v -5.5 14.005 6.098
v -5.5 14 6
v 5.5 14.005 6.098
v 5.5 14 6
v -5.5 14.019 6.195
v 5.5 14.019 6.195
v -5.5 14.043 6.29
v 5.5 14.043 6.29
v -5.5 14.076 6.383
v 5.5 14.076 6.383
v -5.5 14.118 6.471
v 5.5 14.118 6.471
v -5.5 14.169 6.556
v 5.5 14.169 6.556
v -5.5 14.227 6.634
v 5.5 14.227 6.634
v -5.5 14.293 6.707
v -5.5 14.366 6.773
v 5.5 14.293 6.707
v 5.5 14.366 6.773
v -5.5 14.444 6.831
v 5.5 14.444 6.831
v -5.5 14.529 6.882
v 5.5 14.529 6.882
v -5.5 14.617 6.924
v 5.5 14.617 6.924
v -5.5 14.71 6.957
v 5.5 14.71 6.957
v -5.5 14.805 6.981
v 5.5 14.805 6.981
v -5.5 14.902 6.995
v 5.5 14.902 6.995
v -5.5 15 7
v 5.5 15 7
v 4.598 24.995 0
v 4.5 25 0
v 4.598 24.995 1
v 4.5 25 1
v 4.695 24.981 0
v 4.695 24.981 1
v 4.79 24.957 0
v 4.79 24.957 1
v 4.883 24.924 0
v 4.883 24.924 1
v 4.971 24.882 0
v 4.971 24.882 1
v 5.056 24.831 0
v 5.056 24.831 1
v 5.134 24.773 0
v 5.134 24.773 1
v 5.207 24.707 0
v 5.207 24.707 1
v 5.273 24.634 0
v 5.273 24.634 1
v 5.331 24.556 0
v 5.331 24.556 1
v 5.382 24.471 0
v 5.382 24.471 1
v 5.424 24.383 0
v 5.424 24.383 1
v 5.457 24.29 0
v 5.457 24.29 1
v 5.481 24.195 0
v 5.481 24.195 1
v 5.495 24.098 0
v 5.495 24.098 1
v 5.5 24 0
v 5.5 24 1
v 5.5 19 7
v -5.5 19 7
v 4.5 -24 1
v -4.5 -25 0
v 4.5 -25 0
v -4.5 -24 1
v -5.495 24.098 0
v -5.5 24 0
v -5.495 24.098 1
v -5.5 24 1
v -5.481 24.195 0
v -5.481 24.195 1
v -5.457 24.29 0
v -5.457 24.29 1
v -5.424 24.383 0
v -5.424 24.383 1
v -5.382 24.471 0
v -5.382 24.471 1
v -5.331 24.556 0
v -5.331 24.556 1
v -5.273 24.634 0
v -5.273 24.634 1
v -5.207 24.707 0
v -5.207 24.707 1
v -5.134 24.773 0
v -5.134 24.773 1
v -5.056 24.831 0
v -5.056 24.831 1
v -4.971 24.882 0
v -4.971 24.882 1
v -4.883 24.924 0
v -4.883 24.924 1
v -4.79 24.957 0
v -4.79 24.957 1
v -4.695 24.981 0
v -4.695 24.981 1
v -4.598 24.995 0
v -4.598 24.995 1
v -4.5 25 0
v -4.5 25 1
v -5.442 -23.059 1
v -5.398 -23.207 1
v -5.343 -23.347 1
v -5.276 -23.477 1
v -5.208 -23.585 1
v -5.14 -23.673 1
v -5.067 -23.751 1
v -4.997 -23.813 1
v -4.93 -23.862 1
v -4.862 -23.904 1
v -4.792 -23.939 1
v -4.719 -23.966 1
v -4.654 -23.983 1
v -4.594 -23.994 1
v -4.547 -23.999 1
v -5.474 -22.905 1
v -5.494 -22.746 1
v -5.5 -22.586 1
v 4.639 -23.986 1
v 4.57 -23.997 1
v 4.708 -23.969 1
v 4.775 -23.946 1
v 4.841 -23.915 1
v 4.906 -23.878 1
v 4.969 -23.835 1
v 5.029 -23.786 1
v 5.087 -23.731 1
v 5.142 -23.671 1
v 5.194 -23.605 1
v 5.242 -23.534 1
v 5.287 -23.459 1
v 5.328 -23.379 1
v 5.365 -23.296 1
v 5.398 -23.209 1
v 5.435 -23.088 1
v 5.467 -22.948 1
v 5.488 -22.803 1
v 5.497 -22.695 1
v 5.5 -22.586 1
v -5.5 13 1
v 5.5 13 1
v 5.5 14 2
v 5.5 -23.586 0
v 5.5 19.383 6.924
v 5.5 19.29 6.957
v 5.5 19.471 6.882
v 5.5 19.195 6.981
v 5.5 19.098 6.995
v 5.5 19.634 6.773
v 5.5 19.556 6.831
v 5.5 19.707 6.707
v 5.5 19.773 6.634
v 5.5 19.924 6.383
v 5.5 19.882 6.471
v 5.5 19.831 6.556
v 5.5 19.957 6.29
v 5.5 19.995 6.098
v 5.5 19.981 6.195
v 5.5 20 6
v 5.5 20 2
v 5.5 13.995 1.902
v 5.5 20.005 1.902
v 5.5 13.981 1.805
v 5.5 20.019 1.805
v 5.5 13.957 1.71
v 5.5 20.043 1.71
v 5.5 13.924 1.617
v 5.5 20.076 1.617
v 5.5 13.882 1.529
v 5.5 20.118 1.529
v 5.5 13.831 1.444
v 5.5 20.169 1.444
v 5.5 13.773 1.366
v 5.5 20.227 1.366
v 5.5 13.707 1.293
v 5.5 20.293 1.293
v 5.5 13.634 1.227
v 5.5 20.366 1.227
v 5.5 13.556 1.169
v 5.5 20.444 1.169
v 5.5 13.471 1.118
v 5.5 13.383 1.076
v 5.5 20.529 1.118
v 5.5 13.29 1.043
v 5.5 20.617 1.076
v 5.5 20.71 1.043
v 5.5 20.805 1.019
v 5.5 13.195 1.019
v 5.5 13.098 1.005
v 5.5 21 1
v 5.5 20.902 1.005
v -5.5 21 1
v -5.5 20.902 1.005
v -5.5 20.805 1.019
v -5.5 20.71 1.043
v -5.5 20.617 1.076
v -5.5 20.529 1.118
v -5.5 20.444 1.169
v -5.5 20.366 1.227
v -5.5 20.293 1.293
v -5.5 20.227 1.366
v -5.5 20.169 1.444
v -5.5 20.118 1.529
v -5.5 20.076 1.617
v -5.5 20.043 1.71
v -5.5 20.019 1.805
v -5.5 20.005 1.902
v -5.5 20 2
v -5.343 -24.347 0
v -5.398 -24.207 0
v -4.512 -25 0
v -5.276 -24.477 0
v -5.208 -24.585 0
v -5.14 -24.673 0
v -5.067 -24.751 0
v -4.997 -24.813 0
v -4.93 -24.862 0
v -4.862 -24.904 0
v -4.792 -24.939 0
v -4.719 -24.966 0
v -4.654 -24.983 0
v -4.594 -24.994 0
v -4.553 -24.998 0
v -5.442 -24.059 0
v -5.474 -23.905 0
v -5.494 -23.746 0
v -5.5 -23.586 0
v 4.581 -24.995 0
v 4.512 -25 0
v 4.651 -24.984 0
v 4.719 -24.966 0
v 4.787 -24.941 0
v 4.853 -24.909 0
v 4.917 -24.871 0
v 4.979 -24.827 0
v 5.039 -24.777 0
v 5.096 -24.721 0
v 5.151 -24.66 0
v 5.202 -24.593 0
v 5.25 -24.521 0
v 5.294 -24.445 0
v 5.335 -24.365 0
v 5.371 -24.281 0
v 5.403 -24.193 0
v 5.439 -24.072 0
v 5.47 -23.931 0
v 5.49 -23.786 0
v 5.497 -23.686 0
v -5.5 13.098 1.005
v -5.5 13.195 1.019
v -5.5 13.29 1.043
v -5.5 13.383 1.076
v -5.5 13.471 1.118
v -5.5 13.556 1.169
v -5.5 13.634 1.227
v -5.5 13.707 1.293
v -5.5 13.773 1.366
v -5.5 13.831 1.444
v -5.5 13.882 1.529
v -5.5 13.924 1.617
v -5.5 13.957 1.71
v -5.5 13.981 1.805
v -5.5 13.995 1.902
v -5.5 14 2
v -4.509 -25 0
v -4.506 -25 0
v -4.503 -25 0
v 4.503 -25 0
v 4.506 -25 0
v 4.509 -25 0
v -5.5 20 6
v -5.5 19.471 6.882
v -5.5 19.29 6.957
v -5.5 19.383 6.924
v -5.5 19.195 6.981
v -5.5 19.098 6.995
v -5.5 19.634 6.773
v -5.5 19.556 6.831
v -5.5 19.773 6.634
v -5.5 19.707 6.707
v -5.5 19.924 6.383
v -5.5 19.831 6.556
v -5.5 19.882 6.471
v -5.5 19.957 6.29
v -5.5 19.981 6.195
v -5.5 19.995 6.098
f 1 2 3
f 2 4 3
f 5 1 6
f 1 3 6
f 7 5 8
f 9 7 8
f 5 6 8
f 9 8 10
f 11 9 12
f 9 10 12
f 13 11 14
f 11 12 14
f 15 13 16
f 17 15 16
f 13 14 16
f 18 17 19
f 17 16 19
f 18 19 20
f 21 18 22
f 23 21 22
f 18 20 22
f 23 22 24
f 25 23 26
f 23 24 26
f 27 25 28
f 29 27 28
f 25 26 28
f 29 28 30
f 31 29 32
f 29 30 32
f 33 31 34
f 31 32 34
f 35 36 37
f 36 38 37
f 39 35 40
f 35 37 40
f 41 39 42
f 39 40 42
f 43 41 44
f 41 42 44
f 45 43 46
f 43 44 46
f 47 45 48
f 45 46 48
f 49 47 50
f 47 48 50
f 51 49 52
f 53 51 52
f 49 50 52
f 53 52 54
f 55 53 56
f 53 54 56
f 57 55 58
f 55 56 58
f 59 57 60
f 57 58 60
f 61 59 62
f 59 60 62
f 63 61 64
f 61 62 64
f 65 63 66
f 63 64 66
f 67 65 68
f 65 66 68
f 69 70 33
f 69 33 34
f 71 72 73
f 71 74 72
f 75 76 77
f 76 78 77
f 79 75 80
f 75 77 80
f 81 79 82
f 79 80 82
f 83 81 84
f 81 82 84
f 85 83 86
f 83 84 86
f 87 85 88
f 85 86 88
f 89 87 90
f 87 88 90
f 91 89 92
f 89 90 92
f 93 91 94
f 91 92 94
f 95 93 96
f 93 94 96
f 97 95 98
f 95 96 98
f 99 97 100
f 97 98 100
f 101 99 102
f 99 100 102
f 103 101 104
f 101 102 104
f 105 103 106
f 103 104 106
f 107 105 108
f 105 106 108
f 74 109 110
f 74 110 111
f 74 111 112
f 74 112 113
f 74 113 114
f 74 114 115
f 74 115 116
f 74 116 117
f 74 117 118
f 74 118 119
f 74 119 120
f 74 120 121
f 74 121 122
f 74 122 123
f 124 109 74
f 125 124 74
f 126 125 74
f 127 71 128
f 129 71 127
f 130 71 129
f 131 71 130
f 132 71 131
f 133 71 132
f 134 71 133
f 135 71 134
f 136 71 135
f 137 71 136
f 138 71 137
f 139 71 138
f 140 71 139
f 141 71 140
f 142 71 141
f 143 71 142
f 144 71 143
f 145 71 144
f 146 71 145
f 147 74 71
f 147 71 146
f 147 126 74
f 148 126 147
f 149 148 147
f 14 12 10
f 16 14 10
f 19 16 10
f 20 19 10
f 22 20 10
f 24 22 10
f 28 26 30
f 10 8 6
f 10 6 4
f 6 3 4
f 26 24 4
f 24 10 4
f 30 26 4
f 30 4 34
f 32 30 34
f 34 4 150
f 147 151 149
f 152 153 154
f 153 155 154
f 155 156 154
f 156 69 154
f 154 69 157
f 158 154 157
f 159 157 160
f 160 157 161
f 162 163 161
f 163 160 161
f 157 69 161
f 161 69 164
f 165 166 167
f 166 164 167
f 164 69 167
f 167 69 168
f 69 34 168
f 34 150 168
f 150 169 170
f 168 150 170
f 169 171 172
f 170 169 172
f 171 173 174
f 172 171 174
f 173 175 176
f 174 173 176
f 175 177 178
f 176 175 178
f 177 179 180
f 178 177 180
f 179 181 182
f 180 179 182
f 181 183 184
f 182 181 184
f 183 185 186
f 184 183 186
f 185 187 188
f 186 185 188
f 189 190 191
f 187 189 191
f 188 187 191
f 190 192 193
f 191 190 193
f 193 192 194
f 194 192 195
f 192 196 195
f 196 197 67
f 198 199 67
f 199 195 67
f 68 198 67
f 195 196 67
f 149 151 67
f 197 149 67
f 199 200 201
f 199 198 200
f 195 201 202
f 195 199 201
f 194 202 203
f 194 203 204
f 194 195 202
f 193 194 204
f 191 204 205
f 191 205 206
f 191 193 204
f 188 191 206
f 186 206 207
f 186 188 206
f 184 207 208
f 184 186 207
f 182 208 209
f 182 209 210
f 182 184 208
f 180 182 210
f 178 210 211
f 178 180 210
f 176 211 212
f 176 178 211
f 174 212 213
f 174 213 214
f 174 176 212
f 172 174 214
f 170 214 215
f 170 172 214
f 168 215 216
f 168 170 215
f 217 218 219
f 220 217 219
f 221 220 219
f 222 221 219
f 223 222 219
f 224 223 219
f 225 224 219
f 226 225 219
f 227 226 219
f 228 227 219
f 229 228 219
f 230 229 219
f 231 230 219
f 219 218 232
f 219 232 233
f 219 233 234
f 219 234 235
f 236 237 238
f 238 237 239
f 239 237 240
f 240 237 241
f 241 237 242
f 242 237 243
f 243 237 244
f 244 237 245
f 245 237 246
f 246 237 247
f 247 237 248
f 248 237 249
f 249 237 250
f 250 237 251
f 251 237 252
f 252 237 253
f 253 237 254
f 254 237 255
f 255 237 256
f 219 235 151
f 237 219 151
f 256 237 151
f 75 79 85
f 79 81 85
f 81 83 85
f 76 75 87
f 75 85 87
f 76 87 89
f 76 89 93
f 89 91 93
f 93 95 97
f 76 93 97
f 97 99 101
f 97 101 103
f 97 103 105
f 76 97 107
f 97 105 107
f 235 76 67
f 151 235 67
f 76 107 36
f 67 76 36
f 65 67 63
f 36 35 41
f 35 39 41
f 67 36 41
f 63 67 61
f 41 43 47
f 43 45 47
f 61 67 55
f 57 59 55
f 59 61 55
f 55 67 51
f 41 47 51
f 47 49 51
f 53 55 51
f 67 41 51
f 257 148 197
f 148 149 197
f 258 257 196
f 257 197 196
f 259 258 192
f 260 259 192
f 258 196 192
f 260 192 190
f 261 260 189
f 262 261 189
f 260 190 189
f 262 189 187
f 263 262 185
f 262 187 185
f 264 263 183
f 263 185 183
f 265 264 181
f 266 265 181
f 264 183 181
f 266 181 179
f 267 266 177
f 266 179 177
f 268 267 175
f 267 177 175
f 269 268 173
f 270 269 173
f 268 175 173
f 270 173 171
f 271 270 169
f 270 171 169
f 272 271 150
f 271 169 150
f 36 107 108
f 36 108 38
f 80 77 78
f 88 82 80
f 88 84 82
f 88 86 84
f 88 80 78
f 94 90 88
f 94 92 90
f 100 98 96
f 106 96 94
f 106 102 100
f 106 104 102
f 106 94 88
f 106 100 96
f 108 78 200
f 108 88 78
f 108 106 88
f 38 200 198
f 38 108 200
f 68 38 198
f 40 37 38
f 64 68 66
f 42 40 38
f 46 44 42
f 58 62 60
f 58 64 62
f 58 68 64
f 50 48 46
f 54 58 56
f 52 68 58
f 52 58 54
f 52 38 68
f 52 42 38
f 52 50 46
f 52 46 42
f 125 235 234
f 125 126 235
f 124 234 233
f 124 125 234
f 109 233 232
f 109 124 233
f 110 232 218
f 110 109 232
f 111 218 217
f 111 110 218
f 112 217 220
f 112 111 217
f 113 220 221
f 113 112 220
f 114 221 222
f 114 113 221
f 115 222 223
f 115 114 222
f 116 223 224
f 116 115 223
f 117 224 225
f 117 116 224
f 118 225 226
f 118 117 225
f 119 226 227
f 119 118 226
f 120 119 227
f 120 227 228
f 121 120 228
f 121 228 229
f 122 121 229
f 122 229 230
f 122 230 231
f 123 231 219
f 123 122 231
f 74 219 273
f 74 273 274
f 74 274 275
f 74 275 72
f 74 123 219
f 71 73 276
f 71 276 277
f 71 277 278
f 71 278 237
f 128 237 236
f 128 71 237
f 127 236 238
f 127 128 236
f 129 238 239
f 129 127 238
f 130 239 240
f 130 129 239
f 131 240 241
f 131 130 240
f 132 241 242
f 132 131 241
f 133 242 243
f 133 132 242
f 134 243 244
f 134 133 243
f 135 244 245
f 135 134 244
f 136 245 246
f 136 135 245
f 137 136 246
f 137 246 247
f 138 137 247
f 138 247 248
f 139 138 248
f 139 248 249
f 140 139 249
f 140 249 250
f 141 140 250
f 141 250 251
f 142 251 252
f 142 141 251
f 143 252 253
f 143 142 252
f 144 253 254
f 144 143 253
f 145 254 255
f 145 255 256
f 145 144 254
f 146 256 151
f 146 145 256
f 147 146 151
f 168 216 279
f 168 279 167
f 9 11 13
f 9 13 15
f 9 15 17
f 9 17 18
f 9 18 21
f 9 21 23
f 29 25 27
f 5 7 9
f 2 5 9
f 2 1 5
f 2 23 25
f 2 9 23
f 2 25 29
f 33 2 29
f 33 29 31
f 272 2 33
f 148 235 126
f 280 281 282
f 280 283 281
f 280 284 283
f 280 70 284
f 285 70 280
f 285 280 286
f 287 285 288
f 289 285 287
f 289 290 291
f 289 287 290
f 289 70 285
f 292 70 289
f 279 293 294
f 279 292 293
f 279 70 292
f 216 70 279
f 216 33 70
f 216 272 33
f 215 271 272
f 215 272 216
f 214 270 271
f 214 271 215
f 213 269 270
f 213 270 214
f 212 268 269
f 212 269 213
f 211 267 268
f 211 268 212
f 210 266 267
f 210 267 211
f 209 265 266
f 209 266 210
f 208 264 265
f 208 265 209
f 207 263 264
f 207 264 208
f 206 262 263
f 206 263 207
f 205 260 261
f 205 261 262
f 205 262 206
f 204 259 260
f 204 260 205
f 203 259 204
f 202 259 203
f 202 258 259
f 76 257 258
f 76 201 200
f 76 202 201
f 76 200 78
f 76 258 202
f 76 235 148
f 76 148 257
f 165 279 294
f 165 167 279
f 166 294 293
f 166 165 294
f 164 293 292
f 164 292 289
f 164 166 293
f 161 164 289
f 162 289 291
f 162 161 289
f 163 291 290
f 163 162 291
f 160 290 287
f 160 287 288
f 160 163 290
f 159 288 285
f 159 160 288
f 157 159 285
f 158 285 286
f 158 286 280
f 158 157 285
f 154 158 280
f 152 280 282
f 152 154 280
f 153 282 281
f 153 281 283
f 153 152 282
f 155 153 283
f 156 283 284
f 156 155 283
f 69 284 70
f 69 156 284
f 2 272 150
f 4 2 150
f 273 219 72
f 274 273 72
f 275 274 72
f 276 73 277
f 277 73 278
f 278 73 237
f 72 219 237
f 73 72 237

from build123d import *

# Parameters (mm, degrees)
SZKIC1_W                    = 11
SZKIC1_H                    = 50
DODANIE_WYCI_GNI_CIE1_DEPTH = 1
SFAZOWANIE1_SIZE            = 1
SZKIC2_W                    = 11
SZKIC2_H                    = 6
DODANIE_WYCI_GNI_CIE2_DEPTH = 6
ZAOKR_GLENIE1_R             = 1


with BuildPart() as part:
    # Szkic1 → Dodanie-wyciągnięcie1 (new body)
    with BuildSketch(Plane.XY):
        Rectangle(SZKIC1_W, SZKIC1_H)
    extrude(amount=DODANIE_WYCI_GNI_CIE1_DEPTH)

    # Sfazowanie1
    sfazowanie1_edges = [part.edges().sort_by_distance(p)[0] for p in [
        (0, -25, 1),
    ]]
    chamfer(sfazowanie1_edges, length=SFAZOWANIE1_SIZE - 0.0001)  # a hair under: the kernel refuses the full size

    # Szkic2 → Dodanie-wyciągnięcie2 (add)
    with BuildSketch(Plane.XY.offset(1)):
        with Locations((0, 17)):
            Rectangle(SZKIC2_W, SZKIC2_H)
    extrude(amount=DODANIE_WYCI_GNI_CIE2_DEPTH)

    # Zaokrąglenie1
    zaokr_glenie1_edges = [part.edges().sort_by_distance(p)[0] for p in [
        (5.5, -24.50005, 0.50005),
        (-5.5, -24.50005, 0.50005),
        (0, 14, 1),
        (0, 20, 1),
        (0, 14, 7),
        (0, 20, 7),
        (-5.5, 25, 0.5),
        (5.5, 25, 0.5),
    ]]
    fillet(zaokr_glenie1_edges, radius=ZAOKR_GLENIE1_R)


solid = part.part
